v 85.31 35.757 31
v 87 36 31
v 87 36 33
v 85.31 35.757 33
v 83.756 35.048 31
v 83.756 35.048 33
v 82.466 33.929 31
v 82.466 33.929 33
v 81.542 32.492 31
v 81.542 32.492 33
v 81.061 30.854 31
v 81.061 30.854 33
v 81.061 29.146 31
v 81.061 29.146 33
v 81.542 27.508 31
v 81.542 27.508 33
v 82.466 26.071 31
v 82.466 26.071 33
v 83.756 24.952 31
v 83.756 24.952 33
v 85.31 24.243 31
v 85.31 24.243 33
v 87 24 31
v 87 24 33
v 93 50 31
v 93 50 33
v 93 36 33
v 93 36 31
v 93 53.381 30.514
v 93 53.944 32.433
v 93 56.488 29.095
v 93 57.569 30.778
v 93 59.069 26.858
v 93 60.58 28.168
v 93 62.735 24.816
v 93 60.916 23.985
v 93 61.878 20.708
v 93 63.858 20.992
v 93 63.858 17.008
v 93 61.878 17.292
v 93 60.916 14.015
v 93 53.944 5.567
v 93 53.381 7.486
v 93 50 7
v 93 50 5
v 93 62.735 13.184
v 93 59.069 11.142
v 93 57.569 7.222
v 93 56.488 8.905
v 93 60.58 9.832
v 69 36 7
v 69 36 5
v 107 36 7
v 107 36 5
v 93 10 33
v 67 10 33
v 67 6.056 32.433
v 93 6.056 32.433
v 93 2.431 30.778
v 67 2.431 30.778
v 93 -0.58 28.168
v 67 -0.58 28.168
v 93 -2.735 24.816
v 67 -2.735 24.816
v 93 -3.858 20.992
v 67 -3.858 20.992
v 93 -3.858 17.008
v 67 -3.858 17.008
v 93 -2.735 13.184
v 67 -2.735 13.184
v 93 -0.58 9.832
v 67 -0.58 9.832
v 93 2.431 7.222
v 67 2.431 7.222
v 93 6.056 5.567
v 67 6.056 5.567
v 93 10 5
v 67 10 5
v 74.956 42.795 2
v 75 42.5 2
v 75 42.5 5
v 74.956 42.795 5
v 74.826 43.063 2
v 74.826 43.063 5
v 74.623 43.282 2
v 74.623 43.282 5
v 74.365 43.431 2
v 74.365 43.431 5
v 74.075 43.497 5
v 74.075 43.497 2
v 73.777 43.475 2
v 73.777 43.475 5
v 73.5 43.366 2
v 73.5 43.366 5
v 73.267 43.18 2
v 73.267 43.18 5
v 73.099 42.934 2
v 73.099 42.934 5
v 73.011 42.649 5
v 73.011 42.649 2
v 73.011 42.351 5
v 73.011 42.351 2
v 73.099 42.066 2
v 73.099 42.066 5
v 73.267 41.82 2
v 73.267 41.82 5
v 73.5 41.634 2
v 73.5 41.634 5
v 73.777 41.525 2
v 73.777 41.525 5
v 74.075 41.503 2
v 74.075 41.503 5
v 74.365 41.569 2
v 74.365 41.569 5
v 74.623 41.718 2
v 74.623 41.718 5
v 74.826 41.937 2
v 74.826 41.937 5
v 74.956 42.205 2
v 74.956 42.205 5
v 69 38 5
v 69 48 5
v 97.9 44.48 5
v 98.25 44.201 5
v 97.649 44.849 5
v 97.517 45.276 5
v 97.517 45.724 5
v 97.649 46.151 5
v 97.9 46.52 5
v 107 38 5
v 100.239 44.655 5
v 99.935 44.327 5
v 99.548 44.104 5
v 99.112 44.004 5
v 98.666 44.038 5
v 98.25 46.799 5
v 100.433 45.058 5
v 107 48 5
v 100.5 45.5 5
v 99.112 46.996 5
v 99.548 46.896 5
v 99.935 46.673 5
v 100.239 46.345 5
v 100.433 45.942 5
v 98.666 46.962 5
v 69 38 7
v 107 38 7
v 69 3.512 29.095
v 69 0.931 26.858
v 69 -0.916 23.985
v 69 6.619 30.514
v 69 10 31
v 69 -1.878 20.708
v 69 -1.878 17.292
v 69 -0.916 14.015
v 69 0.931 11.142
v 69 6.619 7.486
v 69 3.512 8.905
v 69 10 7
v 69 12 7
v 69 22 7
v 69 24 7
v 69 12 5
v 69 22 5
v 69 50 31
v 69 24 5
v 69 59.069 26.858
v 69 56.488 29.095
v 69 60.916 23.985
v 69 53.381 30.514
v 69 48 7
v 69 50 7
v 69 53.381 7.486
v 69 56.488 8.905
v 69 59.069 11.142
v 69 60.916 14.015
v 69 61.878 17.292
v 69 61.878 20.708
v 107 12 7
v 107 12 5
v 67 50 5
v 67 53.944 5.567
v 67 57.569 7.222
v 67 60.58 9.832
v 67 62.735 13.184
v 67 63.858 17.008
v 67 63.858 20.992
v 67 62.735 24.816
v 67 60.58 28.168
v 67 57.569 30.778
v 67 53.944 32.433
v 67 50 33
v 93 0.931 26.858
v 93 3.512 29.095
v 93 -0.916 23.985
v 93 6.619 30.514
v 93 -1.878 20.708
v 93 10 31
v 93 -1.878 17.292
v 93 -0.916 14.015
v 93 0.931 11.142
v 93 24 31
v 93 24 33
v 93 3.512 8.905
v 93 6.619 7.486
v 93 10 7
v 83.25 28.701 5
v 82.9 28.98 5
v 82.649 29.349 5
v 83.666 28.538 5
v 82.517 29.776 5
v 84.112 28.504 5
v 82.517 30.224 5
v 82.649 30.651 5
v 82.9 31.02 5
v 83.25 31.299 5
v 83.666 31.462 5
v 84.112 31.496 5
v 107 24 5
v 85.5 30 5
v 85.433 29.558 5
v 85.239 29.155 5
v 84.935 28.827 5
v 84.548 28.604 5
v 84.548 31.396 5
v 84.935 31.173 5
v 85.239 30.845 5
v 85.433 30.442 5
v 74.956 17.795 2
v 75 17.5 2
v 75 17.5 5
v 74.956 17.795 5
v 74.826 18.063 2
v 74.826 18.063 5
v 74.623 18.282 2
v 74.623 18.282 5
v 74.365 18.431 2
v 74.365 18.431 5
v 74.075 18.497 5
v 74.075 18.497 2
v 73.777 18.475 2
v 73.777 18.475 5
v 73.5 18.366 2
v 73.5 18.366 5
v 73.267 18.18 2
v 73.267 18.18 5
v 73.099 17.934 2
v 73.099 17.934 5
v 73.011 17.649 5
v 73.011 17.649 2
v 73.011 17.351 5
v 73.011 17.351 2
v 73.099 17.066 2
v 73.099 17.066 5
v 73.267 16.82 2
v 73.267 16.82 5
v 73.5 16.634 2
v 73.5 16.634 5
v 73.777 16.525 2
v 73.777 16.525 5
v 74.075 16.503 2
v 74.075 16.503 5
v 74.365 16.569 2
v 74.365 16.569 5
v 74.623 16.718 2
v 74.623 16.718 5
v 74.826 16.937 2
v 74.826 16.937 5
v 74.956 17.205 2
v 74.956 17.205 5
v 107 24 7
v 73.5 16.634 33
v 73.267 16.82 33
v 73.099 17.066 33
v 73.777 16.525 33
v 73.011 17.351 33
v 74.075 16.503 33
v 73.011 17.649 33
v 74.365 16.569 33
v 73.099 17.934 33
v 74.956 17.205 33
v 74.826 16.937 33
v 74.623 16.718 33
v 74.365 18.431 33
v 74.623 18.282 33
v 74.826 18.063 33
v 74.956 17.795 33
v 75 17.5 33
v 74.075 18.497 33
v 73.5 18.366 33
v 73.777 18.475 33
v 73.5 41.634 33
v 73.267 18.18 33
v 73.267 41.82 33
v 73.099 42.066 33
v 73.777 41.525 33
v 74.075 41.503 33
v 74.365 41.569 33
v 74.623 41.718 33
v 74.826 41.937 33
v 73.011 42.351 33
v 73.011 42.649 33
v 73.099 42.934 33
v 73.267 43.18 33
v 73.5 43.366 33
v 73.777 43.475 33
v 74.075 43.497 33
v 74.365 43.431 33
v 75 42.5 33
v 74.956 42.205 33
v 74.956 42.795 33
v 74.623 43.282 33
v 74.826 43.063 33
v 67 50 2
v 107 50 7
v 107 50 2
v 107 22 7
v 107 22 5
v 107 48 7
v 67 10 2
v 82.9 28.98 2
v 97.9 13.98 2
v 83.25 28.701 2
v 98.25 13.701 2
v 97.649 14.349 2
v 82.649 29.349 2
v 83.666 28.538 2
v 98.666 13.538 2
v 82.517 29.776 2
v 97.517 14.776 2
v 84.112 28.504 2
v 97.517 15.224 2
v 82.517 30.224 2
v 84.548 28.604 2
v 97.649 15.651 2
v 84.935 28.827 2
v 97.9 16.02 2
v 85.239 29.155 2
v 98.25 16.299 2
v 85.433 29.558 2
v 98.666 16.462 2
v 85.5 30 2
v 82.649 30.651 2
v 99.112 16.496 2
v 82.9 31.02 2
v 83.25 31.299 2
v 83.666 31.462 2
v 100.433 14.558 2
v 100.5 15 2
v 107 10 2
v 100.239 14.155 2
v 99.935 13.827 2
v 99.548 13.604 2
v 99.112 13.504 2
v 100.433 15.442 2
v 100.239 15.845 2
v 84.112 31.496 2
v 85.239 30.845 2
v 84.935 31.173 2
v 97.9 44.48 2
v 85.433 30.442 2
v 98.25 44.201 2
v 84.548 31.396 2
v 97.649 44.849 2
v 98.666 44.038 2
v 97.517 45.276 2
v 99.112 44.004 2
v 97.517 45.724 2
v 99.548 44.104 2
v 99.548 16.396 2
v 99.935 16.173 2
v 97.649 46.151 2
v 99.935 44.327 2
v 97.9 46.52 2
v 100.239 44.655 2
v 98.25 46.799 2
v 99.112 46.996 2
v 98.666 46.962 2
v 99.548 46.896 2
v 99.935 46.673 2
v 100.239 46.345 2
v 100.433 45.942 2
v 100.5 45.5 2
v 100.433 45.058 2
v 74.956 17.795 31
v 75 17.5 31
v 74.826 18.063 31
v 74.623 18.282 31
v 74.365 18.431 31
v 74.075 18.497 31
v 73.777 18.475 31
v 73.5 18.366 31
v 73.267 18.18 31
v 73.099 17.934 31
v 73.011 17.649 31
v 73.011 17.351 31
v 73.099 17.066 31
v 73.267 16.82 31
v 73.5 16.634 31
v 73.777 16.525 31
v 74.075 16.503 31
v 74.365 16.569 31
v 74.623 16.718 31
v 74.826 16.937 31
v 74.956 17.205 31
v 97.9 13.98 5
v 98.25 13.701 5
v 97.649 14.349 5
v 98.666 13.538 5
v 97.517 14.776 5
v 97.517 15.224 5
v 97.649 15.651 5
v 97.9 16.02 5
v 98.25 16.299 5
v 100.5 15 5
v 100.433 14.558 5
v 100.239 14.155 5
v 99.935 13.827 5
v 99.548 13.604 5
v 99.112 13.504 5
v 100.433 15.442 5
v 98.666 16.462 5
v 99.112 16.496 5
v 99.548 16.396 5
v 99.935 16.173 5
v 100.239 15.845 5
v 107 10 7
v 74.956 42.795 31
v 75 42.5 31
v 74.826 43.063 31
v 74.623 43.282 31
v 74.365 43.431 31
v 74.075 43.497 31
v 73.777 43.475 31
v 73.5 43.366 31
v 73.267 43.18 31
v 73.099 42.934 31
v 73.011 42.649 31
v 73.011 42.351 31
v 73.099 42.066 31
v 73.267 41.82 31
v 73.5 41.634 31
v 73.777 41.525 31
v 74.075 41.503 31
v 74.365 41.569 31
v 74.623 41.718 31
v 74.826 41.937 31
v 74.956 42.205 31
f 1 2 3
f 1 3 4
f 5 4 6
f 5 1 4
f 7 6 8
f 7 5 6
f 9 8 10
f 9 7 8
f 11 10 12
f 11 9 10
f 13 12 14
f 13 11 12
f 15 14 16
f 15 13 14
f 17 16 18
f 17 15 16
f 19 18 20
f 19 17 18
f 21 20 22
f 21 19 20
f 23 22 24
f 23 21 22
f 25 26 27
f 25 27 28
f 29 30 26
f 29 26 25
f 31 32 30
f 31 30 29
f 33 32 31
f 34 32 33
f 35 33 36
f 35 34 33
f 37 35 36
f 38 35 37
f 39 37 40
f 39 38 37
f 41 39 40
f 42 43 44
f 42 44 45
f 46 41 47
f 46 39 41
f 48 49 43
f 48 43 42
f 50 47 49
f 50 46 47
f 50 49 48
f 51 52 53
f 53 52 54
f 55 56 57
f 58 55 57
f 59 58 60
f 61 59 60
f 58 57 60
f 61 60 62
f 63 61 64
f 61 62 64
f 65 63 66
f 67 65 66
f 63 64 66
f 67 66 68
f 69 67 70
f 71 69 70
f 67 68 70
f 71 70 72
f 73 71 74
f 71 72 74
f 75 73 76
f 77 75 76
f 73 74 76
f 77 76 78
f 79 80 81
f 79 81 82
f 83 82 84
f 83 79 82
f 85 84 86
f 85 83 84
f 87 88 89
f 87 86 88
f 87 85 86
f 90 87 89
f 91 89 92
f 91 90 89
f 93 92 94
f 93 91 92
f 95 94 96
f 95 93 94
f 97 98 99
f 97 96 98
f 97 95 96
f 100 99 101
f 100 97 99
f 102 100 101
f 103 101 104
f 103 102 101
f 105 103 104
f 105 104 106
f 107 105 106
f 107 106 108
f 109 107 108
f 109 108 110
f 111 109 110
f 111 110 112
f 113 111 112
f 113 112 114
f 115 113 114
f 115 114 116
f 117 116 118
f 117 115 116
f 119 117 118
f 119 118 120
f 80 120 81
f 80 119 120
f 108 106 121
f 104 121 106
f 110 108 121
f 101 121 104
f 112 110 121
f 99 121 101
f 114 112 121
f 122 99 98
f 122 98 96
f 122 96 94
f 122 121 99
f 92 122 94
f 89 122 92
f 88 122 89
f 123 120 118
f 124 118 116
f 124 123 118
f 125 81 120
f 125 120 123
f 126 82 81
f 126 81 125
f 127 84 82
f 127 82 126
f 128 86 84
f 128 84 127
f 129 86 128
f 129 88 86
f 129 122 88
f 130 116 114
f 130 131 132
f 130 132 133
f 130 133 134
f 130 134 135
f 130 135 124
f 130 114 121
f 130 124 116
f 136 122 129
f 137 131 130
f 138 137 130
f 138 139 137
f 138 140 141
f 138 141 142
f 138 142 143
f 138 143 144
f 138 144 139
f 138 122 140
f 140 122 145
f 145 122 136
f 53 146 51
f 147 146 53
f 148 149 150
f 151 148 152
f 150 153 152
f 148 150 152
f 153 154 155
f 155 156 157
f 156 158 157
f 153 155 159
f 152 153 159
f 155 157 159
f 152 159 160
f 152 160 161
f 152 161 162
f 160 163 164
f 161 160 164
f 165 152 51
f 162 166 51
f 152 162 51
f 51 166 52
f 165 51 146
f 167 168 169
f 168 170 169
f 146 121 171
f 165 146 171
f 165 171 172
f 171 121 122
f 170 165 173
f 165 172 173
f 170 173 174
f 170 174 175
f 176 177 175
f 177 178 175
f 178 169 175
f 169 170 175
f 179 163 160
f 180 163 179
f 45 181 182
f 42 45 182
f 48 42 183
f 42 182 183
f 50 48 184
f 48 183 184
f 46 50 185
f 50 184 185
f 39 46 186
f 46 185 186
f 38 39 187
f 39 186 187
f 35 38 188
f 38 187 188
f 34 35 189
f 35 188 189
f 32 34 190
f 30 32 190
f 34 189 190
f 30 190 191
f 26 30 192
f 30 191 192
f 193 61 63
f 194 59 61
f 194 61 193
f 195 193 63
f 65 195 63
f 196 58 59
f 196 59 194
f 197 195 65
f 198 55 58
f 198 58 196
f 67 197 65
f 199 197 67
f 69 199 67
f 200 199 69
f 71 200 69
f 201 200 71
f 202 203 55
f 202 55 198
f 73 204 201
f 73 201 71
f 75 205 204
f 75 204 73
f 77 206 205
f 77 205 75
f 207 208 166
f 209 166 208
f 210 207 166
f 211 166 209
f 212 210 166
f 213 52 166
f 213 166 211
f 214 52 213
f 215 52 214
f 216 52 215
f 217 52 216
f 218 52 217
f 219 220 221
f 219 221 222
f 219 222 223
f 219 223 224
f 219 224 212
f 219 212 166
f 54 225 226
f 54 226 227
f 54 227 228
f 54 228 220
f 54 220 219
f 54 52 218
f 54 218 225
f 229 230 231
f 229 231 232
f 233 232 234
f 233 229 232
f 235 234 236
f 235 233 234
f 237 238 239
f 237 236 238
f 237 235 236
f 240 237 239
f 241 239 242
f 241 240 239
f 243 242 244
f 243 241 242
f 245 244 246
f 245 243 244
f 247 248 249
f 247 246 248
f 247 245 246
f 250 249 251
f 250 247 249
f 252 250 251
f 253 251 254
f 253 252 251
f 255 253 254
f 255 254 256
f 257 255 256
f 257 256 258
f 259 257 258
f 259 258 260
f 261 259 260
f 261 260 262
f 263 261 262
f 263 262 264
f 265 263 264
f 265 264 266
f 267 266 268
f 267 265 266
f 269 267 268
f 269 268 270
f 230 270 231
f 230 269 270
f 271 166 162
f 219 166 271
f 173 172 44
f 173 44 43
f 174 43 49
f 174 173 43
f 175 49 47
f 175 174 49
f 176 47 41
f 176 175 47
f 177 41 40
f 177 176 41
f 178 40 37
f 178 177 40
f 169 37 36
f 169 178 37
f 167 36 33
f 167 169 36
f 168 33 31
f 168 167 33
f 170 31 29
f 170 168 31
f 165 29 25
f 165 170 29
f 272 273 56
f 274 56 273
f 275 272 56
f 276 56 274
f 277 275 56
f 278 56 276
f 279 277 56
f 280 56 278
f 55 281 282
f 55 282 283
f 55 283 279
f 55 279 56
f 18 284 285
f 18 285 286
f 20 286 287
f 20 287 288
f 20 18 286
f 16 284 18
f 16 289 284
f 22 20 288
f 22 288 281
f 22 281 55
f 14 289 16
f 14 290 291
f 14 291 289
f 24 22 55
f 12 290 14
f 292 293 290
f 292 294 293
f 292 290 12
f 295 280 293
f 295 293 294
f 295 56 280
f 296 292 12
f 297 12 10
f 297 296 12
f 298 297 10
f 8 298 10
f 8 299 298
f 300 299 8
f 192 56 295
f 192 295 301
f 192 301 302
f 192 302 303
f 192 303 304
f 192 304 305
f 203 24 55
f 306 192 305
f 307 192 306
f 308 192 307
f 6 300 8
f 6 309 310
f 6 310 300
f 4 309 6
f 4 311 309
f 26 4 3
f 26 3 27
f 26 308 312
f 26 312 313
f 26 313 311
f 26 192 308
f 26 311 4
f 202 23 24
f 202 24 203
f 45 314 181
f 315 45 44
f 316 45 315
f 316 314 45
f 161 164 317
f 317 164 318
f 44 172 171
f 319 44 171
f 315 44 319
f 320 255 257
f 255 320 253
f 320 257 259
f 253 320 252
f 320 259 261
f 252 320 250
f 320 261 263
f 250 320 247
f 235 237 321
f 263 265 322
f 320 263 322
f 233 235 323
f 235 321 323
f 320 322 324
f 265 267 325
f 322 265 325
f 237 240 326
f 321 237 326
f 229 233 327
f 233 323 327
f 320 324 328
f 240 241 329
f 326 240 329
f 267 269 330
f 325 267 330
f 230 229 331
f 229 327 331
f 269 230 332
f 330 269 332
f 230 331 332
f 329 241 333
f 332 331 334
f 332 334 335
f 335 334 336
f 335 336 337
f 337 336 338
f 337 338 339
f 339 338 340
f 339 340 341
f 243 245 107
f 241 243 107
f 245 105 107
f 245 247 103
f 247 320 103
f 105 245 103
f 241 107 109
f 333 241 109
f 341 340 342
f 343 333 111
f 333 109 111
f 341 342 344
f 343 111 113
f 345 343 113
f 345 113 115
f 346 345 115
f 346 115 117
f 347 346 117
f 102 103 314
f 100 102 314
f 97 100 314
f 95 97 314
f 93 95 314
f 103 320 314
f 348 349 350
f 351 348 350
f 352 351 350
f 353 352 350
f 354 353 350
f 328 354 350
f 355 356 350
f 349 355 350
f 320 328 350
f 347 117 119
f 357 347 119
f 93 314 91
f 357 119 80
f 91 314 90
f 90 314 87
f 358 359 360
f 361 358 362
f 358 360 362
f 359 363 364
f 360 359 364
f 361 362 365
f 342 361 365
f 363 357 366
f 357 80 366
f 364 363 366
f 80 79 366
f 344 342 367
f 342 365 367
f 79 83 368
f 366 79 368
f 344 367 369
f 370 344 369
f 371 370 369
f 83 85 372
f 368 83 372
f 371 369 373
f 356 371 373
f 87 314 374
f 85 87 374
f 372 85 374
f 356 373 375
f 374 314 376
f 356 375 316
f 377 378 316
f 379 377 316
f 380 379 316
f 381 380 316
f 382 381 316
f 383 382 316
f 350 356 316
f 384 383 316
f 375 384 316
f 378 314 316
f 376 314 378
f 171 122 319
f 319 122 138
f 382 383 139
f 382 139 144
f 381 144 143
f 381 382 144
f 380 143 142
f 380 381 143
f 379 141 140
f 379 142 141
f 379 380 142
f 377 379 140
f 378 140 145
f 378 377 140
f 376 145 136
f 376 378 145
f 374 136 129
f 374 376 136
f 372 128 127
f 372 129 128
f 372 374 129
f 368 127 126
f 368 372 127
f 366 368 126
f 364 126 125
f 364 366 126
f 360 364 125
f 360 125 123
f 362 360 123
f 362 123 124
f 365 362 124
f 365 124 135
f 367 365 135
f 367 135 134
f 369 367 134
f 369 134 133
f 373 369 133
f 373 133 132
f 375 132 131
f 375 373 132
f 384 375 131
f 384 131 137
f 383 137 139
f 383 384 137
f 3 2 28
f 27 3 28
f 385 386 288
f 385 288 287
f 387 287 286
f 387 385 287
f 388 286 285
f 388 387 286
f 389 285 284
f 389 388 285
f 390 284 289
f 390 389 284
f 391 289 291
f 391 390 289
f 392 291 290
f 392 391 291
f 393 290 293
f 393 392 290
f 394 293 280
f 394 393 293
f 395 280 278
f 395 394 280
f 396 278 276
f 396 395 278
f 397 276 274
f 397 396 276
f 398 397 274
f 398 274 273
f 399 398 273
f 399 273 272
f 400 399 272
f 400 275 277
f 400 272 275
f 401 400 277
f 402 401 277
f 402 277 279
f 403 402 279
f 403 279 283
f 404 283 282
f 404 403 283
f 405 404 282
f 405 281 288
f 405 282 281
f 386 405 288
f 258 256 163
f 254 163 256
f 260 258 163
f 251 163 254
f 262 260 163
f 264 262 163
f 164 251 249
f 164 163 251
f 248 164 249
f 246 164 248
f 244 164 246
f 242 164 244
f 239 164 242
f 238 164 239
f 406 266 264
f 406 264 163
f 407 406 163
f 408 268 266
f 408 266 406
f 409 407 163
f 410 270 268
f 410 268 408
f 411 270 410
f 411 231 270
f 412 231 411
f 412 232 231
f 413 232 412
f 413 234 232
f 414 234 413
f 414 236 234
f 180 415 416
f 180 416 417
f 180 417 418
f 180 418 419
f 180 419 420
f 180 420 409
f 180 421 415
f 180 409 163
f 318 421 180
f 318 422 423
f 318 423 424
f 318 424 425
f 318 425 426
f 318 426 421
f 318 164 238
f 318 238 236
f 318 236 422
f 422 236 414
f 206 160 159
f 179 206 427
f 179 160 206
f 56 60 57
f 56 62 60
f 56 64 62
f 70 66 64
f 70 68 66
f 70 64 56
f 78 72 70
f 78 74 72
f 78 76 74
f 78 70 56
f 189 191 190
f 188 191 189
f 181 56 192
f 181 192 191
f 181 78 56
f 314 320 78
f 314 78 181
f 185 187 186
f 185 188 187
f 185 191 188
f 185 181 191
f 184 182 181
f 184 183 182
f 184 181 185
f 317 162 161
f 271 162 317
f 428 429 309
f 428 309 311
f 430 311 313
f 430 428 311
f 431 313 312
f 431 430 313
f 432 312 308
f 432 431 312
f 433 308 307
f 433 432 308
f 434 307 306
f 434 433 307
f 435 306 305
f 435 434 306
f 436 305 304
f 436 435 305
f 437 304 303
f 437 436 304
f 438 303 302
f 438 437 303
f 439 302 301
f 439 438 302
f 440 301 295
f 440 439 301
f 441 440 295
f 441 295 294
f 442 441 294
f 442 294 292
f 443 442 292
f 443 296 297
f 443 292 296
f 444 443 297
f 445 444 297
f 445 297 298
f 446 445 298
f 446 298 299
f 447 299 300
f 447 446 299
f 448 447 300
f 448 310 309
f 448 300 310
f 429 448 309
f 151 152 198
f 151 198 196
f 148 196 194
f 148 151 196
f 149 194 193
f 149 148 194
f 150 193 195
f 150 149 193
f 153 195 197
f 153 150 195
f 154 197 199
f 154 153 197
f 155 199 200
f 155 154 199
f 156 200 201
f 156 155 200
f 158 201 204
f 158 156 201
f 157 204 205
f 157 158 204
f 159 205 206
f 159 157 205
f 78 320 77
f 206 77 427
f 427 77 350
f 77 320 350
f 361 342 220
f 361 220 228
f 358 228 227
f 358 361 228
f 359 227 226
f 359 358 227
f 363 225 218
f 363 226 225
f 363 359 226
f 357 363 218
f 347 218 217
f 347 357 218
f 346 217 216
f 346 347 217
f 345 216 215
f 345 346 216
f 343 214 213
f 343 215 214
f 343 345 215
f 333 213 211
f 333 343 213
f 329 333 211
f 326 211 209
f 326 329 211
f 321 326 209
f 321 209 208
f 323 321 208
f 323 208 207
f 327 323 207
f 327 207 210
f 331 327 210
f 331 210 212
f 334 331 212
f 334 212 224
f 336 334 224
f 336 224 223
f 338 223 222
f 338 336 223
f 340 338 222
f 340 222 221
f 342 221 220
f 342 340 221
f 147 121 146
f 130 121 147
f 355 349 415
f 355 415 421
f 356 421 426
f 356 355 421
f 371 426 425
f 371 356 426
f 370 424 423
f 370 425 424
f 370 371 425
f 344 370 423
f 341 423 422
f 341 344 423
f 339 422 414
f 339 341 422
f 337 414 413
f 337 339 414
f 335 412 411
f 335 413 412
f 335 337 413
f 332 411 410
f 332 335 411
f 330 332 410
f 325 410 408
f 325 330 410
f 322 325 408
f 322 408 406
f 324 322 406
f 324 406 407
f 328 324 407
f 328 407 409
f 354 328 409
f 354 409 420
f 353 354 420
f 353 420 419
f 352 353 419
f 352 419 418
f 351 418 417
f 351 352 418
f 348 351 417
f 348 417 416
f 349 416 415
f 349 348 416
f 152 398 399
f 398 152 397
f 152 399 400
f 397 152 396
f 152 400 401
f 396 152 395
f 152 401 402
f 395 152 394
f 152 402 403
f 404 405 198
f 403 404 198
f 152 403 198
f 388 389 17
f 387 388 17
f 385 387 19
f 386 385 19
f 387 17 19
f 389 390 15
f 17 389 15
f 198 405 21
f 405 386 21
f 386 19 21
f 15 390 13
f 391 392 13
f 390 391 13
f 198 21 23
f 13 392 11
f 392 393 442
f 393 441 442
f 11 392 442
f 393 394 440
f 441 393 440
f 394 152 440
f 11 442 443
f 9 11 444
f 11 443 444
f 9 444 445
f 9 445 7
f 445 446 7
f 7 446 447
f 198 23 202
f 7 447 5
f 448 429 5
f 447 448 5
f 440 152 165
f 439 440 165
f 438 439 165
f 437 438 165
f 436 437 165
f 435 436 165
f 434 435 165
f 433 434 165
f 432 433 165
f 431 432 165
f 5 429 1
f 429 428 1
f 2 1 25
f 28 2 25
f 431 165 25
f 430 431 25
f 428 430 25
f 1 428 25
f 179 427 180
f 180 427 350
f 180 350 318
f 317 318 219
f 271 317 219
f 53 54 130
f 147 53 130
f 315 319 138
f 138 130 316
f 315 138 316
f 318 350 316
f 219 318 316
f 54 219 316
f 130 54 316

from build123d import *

# Parameters (mm, degrees)
CYLINDER002001001002002001002_R           = 1
CYLINDER002001001002002001002_DEPTH       = 40
CYLINDER002001001002002001002001003_R     = 1.5
CYLINDER002001001002002001002001003_DEPTH = 40
CYLINDER002001001002002001002001002_R     = 1.5
CYLINDER002001001002002001002001002_DEPTH = 40
CYLINDER002001001002002001002001001_R     = 1.5
CYLINDER002001001002002001002001001_DEPTH = 40
CYLINDER002001001002002001002001_R        = 1
CYLINDER002001001002002001002001_DEPTH    = 40
CYLINDER002001001002002001001_R           = 12
CYLINDER002001001002002001001_DEPTH       = 26
CYLINDER002001001002002001001_PITCH_ANGLE = 90
CYLINDER001001001_R                       = 12
CYLINDER001001001_DEPTH                   = 26
CYLINDER001001001_PITCH_ANGLE             = 90
BOX001002001003002001001001001001_W       = 40
BOX001002001003002001001001001001_H       = 10
BOX001002001003002001001001001001_DEPTH   = 3
BOX001002001003002001001001001_W          = 40
BOX001002001003002001001001001_H          = 12
BOX001002001003002001001001001_DEPTH      = 3
BOX001002001003002001001001_W             = 40
BOX001002001003002001001001_H             = 10
BOX001002001003002001001001_DEPTH         = 3
BOX001002001003002001003_W                = 10
BOX001002001003002001003_H                = 12
BOX001002001003002001003_DEPTH            = 4
CYLINDER002001001002003001_R              = 6
CYLINDER002001001002003001_DEPTH          = 4
BOX001002001003002001002_W                = 26
BOX001002001003002001002_H                = 40
BOX001002001003002001002_DEPTH            = 24
CYLINDER001001_R                          = 14
CYLINDER001001_DEPTH                      = 26
CYLINDER001001_PITCH_ANGLE                = 90
CYLINDER002001001002002001_R              = 14
CYLINDER002001001002002001_DEPTH          = 26
CYLINDER002001001002002001_PITCH_ANGLE    = 90
BOX001002001003002001001_W                = 40
BOX001002001003002001001_H                = 40
BOX001002001003002001001_DEPTH            = 5
BOX001002001003002001_W                   = 26
BOX001002001003002001_H                   = 40
BOX001002001003002001_DEPTH               = 28


with BuildPart() as cylinder006:
    # Cylinder002001001002002001002 → Cylinder002001001002002001002 (new body)
    with BuildSketch(Plane(origin=(74, 42.5, 0), x_dir=(1, 0, 0), z_dir=(0, 0, 1))):
        Circle(CYLINDER002001001002002001002_R)
    extrude(amount=CYLINDER002001001002002001002_DEPTH)


with BuildPart() as cylinder0010:
    # Cylinder002001001002002001002001003 → Cylinder002001001002002001002001003 (new body)
    with BuildSketch(Plane(origin=(99, 15, 0), x_dir=(1, 0, 0), z_dir=(0, 0, 1))):
        Circle(CYLINDER002001001002002001002001003_R)
    extrude(amount=CYLINDER002001001002002001002001003_DEPTH)


with BuildPart() as cylinder009:
    # Cylinder002001001002002001002001002 → Cylinder002001001002002001002001002 (new body)
    with BuildSketch(Plane(origin=(99, 45.5, 0), x_dir=(1, 0, 0), z_dir=(0, 0, 1))):
        Circle(CYLINDER002001001002002001002001002_R)
    extrude(amount=CYLINDER002001001002002001002001002_DEPTH)


with BuildPart() as cylinder008:
    # Cylinder002001001002002001002001001 → Cylinder002001001002002001002001001 (new body)
    with BuildSketch(Plane(origin=(84, 30, 0), x_dir=(1, 0, 0), z_dir=(0, 0, 1))):
        Circle(CYLINDER002001001002002001002001001_R)
    extrude(amount=CYLINDER002001001002002001002001001_DEPTH)


with BuildPart() as batteryframeholes:
    # Cylinder002001001002002001002001 → Cylinder002001001002002001002001 (new body)
    with BuildSketch(Plane(origin=(74, 17.5, 0), x_dir=(1, 0, 0), z_dir=(0, 0, 1))):
        Circle(CYLINDER002001001002002001002001_R)
    extrude(amount=CYLINDER002001001002002001002001_DEPTH)

    # Fusion002001002002002001005: union Cylinder006, Cylinder0010, Cylinder009, Cylinder008
    add(cylinder006.part)
    add(cylinder0010.part)
    add(cylinder009.part)
    add(cylinder008.part)


with BuildPart() as cylinder005:
    # Cylinder002001001002002001001 → Cylinder002001001002002001001 (new body)
    with BuildSketch(Plane.XY):
        Circle(CYLINDER002001001002002001001_R)
    extrude(amount=CYLINDER002001001002002001001_DEPTH)


with BuildPart() as cylinder005_1:
    # Cylinder002001001002002001001 pitch: moved
    add(cylinder005.part.rotate(Axis((0, 0, 0), (0, 1, 0)), CYLINDER002001001002002001001_PITCH_ANGLE))


with BuildPart() as cylinder005_2:
    # Cylinder002001001002002001001 placement: moved
    add(cylinder005_1.part.moved(Location((2, 10, 19))))


with BuildPart() as cylinder004:
    # Cylinder001001001 → Cylinder001001001 (new body)
    with BuildSketch(Plane.XY):
        Circle(CYLINDER001001001_R)
    extrude(amount=CYLINDER001001001_DEPTH)


with BuildPart() as cylinder004_1:
    # Cylinder001001001 pitch: moved
    add(cylinder004.part.rotate(Axis((0, 0, 0), (0, 1, 0)), CYLINDER001001001_PITCH_ANGLE))


with BuildPart() as cylinder004_2:
    # Cylinder001001001 placement: moved
    add(cylinder004_1.part.moved(Location((2, 50, 19))))


with BuildPart() as box008:
    # Box001002001003002001001001001001 → Box001002001003002001001001001001 (new body)
    with BuildSketch(Plane(origin=(2, 38, 5), x_dir=(1, 0, 0), z_dir=(0, 0, 1))):
        with Locations((20, 5)):
            Rectangle(BOX001002001003002001001001001001_W, BOX001002001003002001001001001001_H)
    extrude(amount=BOX001002001003002001001001001001_DEPTH)


with BuildPart() as box007:
    # Box001002001003002001001001001 → Box001002001003002001001001001 (new body)
    with BuildSketch(Plane(origin=(2, 24, 5), x_dir=(1, 0, 0), z_dir=(0, 0, 1))):
        with Locations((20, 6)):
            Rectangle(BOX001002001003002001001001001_W, BOX001002001003002001001001001_H)
    extrude(amount=BOX001002001003002001001001001_DEPTH)


with BuildPart() as box006:
    # Box001002001003002001001001 → Box001002001003002001001001 (new body)
    with BuildSketch(Plane(origin=(2, 12, 5), x_dir=(1, 0, 0), z_dir=(0, 0, 1))):
        with Locations((20, 5)):
            Rectangle(BOX001002001003002001001001_W, BOX001002001003002001001001_H)
    extrude(amount=BOX001002001003002001001001_DEPTH)


with BuildPart() as box005:
    # Box001002001003002001003 → Box001002001003002001003 (new body)
    with BuildSketch(Plane(origin=(20, 24, 30), x_dir=(1, 0, 0), z_dir=(0, 0, 1))):
        with Locations((5, 6)):
            Rectangle(BOX001002001003002001003_W, BOX001002001003002001003_H)
    extrude(amount=BOX001002001003002001003_DEPTH)


with BuildPart() as powerbutton001:
    # Cylinder002001001002003001 → Cylinder002001001002003001 (new body)
    with BuildSketch(Plane(origin=(20, 30, 30), x_dir=(1, 0, 0), z_dir=(0, 0, 1))):
        Circle(CYLINDER002001001002003001_R)
    extrude(amount=CYLINDER002001001002003001_DEPTH)


with BuildPart() as fusion002001002002002001004:
    # Box001002001003002001002 → Box001002001003002001002 (new body)
    with BuildSketch(Plane(origin=(2, 10, 7), x_dir=(1, 0, 0), z_dir=(0, 0, 1))):
        with Locations((13, 20)):
            Rectangle(BOX001002001003002001002_W, BOX001002001003002001002_H)
    extrude(amount=BOX001002001003002001002_DEPTH)

    # Fusion002001002002002001004: union Cylinder005, Cylinder004, Box008, Box007, Box006, Box005, PowerButton001
    add(cylinder005_2.part)
    add(cylinder004_2.part)
    add(box008.part)
    add(box007.part)
    add(box006.part)
    add(box005.part)
    add(powerbutton001.part)


with BuildPart() as cylinder002:
    # Cylinder001001 → Cylinder001001 (new body)
    with BuildSketch(Plane.XY):
        Circle(CYLINDER001001_R)
    extrude(amount=CYLINDER001001_DEPTH)


with BuildPart() as cylinder002_1:
    # Cylinder001001 pitch: moved
    add(cylinder002.part.rotate(Axis((0, 0, 0), (0, 1, 0)), CYLINDER001001_PITCH_ANGLE))


with BuildPart() as cylinder002_2:
    # Cylinder001001 placement: moved
    add(cylinder002_1.part.moved(Location((0, 50, 19))))


with BuildPart() as cylinder003:
    # Cylinder002001001002002001 → Cylinder002001001002002001 (new body)
    with BuildSketch(Plane.XY):
        Circle(CYLINDER002001001002002001_R)
    extrude(amount=CYLINDER002001001002002001_DEPTH)


with BuildPart() as cylinder003_1:
    # Cylinder002001001002002001 pitch: moved
    add(cylinder003.part.rotate(Axis((0, 0, 0), (0, 1, 0)), CYLINDER002001001002002001_PITCH_ANGLE))


with BuildPart() as cylinder003_2:
    # Cylinder002001001002002001 placement: moved
    add(cylinder003_1.part.moved(Location((0, 10, 19))))


with BuildPart() as box003:
    # Box001002001003002001001 → Box001002001003002001001 (new body)
    with BuildSketch(Plane(origin=(0, 10, 2), x_dir=(1, 0, 0), z_dir=(0, 0, 1))):
        with Locations((20, 20)):
            Rectangle(BOX001002001003002001001_W, BOX001002001003002001001_H)
    extrude(amount=BOX001002001003002001001_DEPTH)


with BuildPart() as batteryframe2:
    # Box001002001003002001 → Box001002001003002001 (new body)
    with BuildSketch(Plane(origin=(0, 10, 5), x_dir=(1, 0, 0), z_dir=(0, 0, 1))):
        with Locations((13, 20)):
            Rectangle(BOX001002001003002001_W, BOX001002001003002001_H)
    extrude(amount=BOX001002001003002001_DEPTH)

    # Fusion002001002002002001003: union Cylinder002, Cylinder003, Box003
    add(cylinder002_2.part)
    add(cylinder003_2.part)
    add(box003.part)

    # Cut001: cut Fusion002001002002002001004
    add(fusion002001002002002001004.part, mode=Mode.SUBTRACT)


with BuildPart() as batteryframe2_1:
    # Cut001 placement: moved
    add(batteryframe2.part.moved(Location((67, 0, 0))))

    # Cut002: cut BatteryFrameHoles
    add(batteryframeholes.part, mode=Mode.SUBTRACT)


solid = batteryframe2_1.part
